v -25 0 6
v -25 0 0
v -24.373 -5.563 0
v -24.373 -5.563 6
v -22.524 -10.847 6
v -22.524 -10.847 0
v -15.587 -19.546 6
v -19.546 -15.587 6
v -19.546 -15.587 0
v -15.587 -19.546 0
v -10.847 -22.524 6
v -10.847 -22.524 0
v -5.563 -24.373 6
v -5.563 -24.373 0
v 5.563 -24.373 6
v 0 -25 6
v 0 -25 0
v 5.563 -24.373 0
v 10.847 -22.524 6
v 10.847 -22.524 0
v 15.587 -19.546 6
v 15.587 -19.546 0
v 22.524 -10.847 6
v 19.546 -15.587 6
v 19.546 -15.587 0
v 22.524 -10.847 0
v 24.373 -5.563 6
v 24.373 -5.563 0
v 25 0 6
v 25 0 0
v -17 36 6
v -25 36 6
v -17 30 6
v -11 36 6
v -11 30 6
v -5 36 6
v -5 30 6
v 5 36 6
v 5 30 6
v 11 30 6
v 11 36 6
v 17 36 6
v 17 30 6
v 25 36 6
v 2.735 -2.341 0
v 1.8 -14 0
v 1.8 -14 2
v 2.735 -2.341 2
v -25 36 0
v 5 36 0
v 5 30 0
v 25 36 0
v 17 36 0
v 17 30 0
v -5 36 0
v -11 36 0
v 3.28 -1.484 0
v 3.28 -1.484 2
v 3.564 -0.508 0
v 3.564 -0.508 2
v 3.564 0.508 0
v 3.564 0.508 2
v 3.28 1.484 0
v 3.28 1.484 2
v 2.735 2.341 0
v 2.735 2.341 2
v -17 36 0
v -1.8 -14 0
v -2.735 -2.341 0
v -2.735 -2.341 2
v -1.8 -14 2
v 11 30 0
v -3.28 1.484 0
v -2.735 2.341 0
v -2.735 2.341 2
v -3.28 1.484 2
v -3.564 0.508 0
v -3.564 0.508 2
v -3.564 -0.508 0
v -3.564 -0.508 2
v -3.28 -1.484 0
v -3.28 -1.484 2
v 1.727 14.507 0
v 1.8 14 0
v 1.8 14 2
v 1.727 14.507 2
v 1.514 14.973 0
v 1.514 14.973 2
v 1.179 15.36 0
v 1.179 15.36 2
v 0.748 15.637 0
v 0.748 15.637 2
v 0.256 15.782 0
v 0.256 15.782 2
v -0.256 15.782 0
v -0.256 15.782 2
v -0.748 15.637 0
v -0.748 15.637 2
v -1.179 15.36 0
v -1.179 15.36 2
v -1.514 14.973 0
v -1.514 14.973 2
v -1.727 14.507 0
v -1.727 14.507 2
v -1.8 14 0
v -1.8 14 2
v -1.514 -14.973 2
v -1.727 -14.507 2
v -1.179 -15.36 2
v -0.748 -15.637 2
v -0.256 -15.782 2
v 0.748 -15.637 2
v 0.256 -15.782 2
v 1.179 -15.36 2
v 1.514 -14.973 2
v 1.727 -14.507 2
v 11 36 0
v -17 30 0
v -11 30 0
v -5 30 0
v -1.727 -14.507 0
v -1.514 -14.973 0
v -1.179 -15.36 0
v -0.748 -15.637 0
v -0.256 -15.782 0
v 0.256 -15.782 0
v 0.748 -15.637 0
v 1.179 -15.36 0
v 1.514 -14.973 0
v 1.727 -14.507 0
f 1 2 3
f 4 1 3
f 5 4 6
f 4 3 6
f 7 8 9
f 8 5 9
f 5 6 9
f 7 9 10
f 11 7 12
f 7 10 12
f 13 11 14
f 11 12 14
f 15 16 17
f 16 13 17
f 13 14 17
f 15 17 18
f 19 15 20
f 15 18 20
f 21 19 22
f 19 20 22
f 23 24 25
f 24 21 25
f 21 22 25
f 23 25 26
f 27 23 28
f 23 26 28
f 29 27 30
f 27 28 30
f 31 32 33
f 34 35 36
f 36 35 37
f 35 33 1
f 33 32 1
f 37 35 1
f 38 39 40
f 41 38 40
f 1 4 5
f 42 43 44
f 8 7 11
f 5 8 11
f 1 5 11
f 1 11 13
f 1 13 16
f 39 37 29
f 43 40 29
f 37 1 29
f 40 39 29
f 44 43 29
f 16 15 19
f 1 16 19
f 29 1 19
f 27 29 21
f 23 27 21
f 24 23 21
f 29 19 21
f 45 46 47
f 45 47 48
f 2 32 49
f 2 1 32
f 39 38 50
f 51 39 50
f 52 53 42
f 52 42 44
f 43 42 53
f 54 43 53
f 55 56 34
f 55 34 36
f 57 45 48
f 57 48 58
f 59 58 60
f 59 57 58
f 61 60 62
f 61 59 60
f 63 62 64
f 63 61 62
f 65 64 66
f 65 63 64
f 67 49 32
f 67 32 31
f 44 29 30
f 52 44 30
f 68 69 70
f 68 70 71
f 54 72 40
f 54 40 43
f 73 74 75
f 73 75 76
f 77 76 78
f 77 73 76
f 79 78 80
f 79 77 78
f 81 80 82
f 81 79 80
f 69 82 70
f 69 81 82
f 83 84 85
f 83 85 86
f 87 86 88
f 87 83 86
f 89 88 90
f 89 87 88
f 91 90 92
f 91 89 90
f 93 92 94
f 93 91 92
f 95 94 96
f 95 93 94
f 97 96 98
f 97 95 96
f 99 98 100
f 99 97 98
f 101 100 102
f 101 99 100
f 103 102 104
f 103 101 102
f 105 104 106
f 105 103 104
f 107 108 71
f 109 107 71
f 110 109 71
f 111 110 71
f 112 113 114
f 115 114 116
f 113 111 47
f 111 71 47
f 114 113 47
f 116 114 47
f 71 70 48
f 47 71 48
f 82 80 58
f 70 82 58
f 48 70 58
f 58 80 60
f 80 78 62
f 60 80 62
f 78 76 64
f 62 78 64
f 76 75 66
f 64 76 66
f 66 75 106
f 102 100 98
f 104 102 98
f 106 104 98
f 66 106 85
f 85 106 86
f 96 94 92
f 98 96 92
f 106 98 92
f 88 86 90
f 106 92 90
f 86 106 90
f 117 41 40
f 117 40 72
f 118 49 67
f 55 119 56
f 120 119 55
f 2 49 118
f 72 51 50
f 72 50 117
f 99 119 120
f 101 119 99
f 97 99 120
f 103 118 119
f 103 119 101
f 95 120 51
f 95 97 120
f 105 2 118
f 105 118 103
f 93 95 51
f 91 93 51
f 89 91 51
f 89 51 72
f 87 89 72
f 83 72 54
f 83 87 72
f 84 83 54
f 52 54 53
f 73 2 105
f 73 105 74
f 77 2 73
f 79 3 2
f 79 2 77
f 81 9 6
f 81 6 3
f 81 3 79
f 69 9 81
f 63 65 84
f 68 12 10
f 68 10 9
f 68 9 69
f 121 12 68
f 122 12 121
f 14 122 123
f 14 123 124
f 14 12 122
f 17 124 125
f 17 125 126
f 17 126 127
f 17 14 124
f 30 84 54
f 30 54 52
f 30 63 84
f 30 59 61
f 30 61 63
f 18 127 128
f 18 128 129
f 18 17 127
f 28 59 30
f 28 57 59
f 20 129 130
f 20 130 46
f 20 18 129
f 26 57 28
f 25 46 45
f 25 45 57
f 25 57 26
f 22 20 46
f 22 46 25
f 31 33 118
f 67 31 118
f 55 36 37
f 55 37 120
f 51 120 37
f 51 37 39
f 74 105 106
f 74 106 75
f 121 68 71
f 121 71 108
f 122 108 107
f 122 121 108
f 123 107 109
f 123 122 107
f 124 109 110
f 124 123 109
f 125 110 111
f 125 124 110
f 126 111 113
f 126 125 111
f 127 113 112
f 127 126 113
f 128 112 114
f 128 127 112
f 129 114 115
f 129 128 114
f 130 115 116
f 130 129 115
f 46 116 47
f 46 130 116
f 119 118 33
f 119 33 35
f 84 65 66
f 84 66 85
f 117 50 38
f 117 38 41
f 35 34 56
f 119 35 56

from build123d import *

# Parameters (mm, degrees)
SKETCH2_R                = 25
BOSS_EXTRUDE1_DEPTH      = 6
BOSS_EXTRUDE2_START      = -4
BOSS_EXTRUDE2_DEPTH      = 4
BOSS_EXTRUDE4_DEPTH      = 6
SKETCH5_W                = 8
SKETCH5_H                = 6
SKETCH5_W_2              = 6
BOSS_EXTRUDE5_DEPTH      = 6
MOVE_START               = 31
MOVE_FACE1_OUTLINE_W     = 8
MOVE_FACE1_OUTLINE_H     = 6
MOVE_FACE1_OUTLINE_W_2   = 6
MOVE_FACE1_DEPTH         = 5
MOVE_START_2             = 25
MOVE_FACE1_2_OUTLINE_W   = 6
MOVE_FACE1_2_OUTLINE_H   = 6
MOVE_FACE1_2_OUTLINE_W_2 = 10
MOVE_FACE1_2_DEPTH       = 5


# Read off the part's stored shape, not the designer's step: Move Face1
with BuildPart() as part:
    # Sketch2 → Boss-Extrude1 (new body)
    with BuildSketch(Plane.XY):
        Circle(SKETCH2_R)
        with BuildLine():
            Line((-2.73463726, -2.341315668), (-1.8, -14))
            ThreePointArc((-1.8, -14), (0, -15.8), (1.8, -14))
            Line((1.8, -14), (2.73463726, -2.341315668))
            ThreePointArc((2.73463726, -2.341315668), (3.6, 0), (2.73463726, 2.341315668))
            Line((2.73463726, 2.341315668), (1.8, 14))
            ThreePointArc((1.8, 14), (0, 15.8), (-1.8, 14))
            Line((-1.8, 14), (-2.73463726, 2.341315668))
            ThreePointArc((-2.73463726, 2.341315668), (-3.6, 0), (-2.73463726, -2.341315668))
        make_face(mode=Mode.SUBTRACT)
    extrude(amount=BOSS_EXTRUDE1_DEPTH)

    # Sketch3 → Boss-Extrude2 (add)
    with BuildSketch(Plane.XY.offset(6).offset(BOSS_EXTRUDE2_START)):
        with BuildLine():
            Line((2.73463726, 2.341315668), (1.8, 14))
            ThreePointArc((1.8, 14), (0, 15.8), (-1.8, 14))
            Line((-1.8, 14), (-2.73463726, 2.341315668))
            ThreePointArc((-2.73463726, 2.341315668), (-3.6, 0), (-2.73463726, -2.341315668))
            Line((-2.73463726, -2.341315668), (-1.8, -14))
            ThreePointArc((-1.8, -14), (0, -15.8), (1.8, -14))
            Line((1.8, -14), (2.73463726, -2.341315668))
            ThreePointArc((2.73463726, -2.341315668), (3.6, 0), (2.73463726, 2.341315668))
        make_face()
    extrude(amount=BOSS_EXTRUDE2_DEPTH)


with BuildPart() as body_2:
    # Sketch4 → Boss-Extrude4 (new body)
    with BuildSketch(Plane(origin=(0, 0, 0), x_dir=(-1, 0, 0), z_dir=(0, 0, -1))):
        with BuildLine():
            Line((25, 0), (25, 25))
            Line((25, 25), (0, 25))
            ThreePointArc((0, 25), (17.67766953, 17.67766953), (25, 0))
        make_face()
    extrude(amount=-BOSS_EXTRUDE4_DEPTH)


with BuildPart() as body_3:
    # Mirror1: mirrored copy
    add(body_2.part.mirror(Plane.ZY))


with BuildPart() as part_1:
    add(part.part)

    # Combine1: union body 2, body 3
    add(body_2.part)
    add(body_3.part)

    # Sketch5 → Boss-Extrude5 (add)
    with BuildSketch(Plane(origin=(0, 25, 0), x_dir=(1, 0, 0), z_dir=(0, 1, 0))):
        with Locations((21, -3)):
            Rectangle(SKETCH5_W, SKETCH5_H)
        with Locations((-8, -3)):
            Rectangle(SKETCH5_W_2, SKETCH5_H)
        with Locations((8, -3)):
            Rectangle(SKETCH5_W_2, SKETCH5_H)
        with Locations((-21, -3)):
            Rectangle(SKETCH5_W, SKETCH5_H)
    extrude(amount=BOSS_EXTRUDE5_DEPTH)

    # Move Face1 outline → Move Face1 (add)
    with BuildSketch(Plane(origin=(0, 0, 0), x_dir=(1, 0, 0), z_dir=(0, 1, 0)).offset(MOVE_START)):
        with Locations((-21, -3)):
            Rectangle(MOVE_FACE1_OUTLINE_W, MOVE_FACE1_OUTLINE_H)
        with Locations((-8, -3)):
            Rectangle(MOVE_FACE1_OUTLINE_W_2, MOVE_FACE1_OUTLINE_H)
        with Locations((8, -3)):
            Rectangle(MOVE_FACE1_OUTLINE_W_2, MOVE_FACE1_OUTLINE_H)
        with Locations((21, -3)):
            Rectangle(MOVE_FACE1_OUTLINE_W, MOVE_FACE1_OUTLINE_H)
    extrude(amount=MOVE_FACE1_DEPTH)

    # Move Face1 2 outline → Move Face1 2 (add)
    with BuildSketch(Plane(origin=(0, 0, 0), x_dir=(1, 0, 0), z_dir=(0, 1, 0)).offset(MOVE_START_2)):
        with Locations((-14, -3)):
            Rectangle(MOVE_FACE1_2_OUTLINE_W, MOVE_FACE1_2_OUTLINE_H)
        with Locations((0, -3)):
            Rectangle(MOVE_FACE1_2_OUTLINE_W_2, MOVE_FACE1_2_OUTLINE_H)
        with Locations((14, -3)):
            Rectangle(MOVE_FACE1_2_OUTLINE_W, MOVE_FACE1_2_OUTLINE_H)
    extrude(amount=MOVE_FACE1_2_DEPTH)


solid = part_1.part
